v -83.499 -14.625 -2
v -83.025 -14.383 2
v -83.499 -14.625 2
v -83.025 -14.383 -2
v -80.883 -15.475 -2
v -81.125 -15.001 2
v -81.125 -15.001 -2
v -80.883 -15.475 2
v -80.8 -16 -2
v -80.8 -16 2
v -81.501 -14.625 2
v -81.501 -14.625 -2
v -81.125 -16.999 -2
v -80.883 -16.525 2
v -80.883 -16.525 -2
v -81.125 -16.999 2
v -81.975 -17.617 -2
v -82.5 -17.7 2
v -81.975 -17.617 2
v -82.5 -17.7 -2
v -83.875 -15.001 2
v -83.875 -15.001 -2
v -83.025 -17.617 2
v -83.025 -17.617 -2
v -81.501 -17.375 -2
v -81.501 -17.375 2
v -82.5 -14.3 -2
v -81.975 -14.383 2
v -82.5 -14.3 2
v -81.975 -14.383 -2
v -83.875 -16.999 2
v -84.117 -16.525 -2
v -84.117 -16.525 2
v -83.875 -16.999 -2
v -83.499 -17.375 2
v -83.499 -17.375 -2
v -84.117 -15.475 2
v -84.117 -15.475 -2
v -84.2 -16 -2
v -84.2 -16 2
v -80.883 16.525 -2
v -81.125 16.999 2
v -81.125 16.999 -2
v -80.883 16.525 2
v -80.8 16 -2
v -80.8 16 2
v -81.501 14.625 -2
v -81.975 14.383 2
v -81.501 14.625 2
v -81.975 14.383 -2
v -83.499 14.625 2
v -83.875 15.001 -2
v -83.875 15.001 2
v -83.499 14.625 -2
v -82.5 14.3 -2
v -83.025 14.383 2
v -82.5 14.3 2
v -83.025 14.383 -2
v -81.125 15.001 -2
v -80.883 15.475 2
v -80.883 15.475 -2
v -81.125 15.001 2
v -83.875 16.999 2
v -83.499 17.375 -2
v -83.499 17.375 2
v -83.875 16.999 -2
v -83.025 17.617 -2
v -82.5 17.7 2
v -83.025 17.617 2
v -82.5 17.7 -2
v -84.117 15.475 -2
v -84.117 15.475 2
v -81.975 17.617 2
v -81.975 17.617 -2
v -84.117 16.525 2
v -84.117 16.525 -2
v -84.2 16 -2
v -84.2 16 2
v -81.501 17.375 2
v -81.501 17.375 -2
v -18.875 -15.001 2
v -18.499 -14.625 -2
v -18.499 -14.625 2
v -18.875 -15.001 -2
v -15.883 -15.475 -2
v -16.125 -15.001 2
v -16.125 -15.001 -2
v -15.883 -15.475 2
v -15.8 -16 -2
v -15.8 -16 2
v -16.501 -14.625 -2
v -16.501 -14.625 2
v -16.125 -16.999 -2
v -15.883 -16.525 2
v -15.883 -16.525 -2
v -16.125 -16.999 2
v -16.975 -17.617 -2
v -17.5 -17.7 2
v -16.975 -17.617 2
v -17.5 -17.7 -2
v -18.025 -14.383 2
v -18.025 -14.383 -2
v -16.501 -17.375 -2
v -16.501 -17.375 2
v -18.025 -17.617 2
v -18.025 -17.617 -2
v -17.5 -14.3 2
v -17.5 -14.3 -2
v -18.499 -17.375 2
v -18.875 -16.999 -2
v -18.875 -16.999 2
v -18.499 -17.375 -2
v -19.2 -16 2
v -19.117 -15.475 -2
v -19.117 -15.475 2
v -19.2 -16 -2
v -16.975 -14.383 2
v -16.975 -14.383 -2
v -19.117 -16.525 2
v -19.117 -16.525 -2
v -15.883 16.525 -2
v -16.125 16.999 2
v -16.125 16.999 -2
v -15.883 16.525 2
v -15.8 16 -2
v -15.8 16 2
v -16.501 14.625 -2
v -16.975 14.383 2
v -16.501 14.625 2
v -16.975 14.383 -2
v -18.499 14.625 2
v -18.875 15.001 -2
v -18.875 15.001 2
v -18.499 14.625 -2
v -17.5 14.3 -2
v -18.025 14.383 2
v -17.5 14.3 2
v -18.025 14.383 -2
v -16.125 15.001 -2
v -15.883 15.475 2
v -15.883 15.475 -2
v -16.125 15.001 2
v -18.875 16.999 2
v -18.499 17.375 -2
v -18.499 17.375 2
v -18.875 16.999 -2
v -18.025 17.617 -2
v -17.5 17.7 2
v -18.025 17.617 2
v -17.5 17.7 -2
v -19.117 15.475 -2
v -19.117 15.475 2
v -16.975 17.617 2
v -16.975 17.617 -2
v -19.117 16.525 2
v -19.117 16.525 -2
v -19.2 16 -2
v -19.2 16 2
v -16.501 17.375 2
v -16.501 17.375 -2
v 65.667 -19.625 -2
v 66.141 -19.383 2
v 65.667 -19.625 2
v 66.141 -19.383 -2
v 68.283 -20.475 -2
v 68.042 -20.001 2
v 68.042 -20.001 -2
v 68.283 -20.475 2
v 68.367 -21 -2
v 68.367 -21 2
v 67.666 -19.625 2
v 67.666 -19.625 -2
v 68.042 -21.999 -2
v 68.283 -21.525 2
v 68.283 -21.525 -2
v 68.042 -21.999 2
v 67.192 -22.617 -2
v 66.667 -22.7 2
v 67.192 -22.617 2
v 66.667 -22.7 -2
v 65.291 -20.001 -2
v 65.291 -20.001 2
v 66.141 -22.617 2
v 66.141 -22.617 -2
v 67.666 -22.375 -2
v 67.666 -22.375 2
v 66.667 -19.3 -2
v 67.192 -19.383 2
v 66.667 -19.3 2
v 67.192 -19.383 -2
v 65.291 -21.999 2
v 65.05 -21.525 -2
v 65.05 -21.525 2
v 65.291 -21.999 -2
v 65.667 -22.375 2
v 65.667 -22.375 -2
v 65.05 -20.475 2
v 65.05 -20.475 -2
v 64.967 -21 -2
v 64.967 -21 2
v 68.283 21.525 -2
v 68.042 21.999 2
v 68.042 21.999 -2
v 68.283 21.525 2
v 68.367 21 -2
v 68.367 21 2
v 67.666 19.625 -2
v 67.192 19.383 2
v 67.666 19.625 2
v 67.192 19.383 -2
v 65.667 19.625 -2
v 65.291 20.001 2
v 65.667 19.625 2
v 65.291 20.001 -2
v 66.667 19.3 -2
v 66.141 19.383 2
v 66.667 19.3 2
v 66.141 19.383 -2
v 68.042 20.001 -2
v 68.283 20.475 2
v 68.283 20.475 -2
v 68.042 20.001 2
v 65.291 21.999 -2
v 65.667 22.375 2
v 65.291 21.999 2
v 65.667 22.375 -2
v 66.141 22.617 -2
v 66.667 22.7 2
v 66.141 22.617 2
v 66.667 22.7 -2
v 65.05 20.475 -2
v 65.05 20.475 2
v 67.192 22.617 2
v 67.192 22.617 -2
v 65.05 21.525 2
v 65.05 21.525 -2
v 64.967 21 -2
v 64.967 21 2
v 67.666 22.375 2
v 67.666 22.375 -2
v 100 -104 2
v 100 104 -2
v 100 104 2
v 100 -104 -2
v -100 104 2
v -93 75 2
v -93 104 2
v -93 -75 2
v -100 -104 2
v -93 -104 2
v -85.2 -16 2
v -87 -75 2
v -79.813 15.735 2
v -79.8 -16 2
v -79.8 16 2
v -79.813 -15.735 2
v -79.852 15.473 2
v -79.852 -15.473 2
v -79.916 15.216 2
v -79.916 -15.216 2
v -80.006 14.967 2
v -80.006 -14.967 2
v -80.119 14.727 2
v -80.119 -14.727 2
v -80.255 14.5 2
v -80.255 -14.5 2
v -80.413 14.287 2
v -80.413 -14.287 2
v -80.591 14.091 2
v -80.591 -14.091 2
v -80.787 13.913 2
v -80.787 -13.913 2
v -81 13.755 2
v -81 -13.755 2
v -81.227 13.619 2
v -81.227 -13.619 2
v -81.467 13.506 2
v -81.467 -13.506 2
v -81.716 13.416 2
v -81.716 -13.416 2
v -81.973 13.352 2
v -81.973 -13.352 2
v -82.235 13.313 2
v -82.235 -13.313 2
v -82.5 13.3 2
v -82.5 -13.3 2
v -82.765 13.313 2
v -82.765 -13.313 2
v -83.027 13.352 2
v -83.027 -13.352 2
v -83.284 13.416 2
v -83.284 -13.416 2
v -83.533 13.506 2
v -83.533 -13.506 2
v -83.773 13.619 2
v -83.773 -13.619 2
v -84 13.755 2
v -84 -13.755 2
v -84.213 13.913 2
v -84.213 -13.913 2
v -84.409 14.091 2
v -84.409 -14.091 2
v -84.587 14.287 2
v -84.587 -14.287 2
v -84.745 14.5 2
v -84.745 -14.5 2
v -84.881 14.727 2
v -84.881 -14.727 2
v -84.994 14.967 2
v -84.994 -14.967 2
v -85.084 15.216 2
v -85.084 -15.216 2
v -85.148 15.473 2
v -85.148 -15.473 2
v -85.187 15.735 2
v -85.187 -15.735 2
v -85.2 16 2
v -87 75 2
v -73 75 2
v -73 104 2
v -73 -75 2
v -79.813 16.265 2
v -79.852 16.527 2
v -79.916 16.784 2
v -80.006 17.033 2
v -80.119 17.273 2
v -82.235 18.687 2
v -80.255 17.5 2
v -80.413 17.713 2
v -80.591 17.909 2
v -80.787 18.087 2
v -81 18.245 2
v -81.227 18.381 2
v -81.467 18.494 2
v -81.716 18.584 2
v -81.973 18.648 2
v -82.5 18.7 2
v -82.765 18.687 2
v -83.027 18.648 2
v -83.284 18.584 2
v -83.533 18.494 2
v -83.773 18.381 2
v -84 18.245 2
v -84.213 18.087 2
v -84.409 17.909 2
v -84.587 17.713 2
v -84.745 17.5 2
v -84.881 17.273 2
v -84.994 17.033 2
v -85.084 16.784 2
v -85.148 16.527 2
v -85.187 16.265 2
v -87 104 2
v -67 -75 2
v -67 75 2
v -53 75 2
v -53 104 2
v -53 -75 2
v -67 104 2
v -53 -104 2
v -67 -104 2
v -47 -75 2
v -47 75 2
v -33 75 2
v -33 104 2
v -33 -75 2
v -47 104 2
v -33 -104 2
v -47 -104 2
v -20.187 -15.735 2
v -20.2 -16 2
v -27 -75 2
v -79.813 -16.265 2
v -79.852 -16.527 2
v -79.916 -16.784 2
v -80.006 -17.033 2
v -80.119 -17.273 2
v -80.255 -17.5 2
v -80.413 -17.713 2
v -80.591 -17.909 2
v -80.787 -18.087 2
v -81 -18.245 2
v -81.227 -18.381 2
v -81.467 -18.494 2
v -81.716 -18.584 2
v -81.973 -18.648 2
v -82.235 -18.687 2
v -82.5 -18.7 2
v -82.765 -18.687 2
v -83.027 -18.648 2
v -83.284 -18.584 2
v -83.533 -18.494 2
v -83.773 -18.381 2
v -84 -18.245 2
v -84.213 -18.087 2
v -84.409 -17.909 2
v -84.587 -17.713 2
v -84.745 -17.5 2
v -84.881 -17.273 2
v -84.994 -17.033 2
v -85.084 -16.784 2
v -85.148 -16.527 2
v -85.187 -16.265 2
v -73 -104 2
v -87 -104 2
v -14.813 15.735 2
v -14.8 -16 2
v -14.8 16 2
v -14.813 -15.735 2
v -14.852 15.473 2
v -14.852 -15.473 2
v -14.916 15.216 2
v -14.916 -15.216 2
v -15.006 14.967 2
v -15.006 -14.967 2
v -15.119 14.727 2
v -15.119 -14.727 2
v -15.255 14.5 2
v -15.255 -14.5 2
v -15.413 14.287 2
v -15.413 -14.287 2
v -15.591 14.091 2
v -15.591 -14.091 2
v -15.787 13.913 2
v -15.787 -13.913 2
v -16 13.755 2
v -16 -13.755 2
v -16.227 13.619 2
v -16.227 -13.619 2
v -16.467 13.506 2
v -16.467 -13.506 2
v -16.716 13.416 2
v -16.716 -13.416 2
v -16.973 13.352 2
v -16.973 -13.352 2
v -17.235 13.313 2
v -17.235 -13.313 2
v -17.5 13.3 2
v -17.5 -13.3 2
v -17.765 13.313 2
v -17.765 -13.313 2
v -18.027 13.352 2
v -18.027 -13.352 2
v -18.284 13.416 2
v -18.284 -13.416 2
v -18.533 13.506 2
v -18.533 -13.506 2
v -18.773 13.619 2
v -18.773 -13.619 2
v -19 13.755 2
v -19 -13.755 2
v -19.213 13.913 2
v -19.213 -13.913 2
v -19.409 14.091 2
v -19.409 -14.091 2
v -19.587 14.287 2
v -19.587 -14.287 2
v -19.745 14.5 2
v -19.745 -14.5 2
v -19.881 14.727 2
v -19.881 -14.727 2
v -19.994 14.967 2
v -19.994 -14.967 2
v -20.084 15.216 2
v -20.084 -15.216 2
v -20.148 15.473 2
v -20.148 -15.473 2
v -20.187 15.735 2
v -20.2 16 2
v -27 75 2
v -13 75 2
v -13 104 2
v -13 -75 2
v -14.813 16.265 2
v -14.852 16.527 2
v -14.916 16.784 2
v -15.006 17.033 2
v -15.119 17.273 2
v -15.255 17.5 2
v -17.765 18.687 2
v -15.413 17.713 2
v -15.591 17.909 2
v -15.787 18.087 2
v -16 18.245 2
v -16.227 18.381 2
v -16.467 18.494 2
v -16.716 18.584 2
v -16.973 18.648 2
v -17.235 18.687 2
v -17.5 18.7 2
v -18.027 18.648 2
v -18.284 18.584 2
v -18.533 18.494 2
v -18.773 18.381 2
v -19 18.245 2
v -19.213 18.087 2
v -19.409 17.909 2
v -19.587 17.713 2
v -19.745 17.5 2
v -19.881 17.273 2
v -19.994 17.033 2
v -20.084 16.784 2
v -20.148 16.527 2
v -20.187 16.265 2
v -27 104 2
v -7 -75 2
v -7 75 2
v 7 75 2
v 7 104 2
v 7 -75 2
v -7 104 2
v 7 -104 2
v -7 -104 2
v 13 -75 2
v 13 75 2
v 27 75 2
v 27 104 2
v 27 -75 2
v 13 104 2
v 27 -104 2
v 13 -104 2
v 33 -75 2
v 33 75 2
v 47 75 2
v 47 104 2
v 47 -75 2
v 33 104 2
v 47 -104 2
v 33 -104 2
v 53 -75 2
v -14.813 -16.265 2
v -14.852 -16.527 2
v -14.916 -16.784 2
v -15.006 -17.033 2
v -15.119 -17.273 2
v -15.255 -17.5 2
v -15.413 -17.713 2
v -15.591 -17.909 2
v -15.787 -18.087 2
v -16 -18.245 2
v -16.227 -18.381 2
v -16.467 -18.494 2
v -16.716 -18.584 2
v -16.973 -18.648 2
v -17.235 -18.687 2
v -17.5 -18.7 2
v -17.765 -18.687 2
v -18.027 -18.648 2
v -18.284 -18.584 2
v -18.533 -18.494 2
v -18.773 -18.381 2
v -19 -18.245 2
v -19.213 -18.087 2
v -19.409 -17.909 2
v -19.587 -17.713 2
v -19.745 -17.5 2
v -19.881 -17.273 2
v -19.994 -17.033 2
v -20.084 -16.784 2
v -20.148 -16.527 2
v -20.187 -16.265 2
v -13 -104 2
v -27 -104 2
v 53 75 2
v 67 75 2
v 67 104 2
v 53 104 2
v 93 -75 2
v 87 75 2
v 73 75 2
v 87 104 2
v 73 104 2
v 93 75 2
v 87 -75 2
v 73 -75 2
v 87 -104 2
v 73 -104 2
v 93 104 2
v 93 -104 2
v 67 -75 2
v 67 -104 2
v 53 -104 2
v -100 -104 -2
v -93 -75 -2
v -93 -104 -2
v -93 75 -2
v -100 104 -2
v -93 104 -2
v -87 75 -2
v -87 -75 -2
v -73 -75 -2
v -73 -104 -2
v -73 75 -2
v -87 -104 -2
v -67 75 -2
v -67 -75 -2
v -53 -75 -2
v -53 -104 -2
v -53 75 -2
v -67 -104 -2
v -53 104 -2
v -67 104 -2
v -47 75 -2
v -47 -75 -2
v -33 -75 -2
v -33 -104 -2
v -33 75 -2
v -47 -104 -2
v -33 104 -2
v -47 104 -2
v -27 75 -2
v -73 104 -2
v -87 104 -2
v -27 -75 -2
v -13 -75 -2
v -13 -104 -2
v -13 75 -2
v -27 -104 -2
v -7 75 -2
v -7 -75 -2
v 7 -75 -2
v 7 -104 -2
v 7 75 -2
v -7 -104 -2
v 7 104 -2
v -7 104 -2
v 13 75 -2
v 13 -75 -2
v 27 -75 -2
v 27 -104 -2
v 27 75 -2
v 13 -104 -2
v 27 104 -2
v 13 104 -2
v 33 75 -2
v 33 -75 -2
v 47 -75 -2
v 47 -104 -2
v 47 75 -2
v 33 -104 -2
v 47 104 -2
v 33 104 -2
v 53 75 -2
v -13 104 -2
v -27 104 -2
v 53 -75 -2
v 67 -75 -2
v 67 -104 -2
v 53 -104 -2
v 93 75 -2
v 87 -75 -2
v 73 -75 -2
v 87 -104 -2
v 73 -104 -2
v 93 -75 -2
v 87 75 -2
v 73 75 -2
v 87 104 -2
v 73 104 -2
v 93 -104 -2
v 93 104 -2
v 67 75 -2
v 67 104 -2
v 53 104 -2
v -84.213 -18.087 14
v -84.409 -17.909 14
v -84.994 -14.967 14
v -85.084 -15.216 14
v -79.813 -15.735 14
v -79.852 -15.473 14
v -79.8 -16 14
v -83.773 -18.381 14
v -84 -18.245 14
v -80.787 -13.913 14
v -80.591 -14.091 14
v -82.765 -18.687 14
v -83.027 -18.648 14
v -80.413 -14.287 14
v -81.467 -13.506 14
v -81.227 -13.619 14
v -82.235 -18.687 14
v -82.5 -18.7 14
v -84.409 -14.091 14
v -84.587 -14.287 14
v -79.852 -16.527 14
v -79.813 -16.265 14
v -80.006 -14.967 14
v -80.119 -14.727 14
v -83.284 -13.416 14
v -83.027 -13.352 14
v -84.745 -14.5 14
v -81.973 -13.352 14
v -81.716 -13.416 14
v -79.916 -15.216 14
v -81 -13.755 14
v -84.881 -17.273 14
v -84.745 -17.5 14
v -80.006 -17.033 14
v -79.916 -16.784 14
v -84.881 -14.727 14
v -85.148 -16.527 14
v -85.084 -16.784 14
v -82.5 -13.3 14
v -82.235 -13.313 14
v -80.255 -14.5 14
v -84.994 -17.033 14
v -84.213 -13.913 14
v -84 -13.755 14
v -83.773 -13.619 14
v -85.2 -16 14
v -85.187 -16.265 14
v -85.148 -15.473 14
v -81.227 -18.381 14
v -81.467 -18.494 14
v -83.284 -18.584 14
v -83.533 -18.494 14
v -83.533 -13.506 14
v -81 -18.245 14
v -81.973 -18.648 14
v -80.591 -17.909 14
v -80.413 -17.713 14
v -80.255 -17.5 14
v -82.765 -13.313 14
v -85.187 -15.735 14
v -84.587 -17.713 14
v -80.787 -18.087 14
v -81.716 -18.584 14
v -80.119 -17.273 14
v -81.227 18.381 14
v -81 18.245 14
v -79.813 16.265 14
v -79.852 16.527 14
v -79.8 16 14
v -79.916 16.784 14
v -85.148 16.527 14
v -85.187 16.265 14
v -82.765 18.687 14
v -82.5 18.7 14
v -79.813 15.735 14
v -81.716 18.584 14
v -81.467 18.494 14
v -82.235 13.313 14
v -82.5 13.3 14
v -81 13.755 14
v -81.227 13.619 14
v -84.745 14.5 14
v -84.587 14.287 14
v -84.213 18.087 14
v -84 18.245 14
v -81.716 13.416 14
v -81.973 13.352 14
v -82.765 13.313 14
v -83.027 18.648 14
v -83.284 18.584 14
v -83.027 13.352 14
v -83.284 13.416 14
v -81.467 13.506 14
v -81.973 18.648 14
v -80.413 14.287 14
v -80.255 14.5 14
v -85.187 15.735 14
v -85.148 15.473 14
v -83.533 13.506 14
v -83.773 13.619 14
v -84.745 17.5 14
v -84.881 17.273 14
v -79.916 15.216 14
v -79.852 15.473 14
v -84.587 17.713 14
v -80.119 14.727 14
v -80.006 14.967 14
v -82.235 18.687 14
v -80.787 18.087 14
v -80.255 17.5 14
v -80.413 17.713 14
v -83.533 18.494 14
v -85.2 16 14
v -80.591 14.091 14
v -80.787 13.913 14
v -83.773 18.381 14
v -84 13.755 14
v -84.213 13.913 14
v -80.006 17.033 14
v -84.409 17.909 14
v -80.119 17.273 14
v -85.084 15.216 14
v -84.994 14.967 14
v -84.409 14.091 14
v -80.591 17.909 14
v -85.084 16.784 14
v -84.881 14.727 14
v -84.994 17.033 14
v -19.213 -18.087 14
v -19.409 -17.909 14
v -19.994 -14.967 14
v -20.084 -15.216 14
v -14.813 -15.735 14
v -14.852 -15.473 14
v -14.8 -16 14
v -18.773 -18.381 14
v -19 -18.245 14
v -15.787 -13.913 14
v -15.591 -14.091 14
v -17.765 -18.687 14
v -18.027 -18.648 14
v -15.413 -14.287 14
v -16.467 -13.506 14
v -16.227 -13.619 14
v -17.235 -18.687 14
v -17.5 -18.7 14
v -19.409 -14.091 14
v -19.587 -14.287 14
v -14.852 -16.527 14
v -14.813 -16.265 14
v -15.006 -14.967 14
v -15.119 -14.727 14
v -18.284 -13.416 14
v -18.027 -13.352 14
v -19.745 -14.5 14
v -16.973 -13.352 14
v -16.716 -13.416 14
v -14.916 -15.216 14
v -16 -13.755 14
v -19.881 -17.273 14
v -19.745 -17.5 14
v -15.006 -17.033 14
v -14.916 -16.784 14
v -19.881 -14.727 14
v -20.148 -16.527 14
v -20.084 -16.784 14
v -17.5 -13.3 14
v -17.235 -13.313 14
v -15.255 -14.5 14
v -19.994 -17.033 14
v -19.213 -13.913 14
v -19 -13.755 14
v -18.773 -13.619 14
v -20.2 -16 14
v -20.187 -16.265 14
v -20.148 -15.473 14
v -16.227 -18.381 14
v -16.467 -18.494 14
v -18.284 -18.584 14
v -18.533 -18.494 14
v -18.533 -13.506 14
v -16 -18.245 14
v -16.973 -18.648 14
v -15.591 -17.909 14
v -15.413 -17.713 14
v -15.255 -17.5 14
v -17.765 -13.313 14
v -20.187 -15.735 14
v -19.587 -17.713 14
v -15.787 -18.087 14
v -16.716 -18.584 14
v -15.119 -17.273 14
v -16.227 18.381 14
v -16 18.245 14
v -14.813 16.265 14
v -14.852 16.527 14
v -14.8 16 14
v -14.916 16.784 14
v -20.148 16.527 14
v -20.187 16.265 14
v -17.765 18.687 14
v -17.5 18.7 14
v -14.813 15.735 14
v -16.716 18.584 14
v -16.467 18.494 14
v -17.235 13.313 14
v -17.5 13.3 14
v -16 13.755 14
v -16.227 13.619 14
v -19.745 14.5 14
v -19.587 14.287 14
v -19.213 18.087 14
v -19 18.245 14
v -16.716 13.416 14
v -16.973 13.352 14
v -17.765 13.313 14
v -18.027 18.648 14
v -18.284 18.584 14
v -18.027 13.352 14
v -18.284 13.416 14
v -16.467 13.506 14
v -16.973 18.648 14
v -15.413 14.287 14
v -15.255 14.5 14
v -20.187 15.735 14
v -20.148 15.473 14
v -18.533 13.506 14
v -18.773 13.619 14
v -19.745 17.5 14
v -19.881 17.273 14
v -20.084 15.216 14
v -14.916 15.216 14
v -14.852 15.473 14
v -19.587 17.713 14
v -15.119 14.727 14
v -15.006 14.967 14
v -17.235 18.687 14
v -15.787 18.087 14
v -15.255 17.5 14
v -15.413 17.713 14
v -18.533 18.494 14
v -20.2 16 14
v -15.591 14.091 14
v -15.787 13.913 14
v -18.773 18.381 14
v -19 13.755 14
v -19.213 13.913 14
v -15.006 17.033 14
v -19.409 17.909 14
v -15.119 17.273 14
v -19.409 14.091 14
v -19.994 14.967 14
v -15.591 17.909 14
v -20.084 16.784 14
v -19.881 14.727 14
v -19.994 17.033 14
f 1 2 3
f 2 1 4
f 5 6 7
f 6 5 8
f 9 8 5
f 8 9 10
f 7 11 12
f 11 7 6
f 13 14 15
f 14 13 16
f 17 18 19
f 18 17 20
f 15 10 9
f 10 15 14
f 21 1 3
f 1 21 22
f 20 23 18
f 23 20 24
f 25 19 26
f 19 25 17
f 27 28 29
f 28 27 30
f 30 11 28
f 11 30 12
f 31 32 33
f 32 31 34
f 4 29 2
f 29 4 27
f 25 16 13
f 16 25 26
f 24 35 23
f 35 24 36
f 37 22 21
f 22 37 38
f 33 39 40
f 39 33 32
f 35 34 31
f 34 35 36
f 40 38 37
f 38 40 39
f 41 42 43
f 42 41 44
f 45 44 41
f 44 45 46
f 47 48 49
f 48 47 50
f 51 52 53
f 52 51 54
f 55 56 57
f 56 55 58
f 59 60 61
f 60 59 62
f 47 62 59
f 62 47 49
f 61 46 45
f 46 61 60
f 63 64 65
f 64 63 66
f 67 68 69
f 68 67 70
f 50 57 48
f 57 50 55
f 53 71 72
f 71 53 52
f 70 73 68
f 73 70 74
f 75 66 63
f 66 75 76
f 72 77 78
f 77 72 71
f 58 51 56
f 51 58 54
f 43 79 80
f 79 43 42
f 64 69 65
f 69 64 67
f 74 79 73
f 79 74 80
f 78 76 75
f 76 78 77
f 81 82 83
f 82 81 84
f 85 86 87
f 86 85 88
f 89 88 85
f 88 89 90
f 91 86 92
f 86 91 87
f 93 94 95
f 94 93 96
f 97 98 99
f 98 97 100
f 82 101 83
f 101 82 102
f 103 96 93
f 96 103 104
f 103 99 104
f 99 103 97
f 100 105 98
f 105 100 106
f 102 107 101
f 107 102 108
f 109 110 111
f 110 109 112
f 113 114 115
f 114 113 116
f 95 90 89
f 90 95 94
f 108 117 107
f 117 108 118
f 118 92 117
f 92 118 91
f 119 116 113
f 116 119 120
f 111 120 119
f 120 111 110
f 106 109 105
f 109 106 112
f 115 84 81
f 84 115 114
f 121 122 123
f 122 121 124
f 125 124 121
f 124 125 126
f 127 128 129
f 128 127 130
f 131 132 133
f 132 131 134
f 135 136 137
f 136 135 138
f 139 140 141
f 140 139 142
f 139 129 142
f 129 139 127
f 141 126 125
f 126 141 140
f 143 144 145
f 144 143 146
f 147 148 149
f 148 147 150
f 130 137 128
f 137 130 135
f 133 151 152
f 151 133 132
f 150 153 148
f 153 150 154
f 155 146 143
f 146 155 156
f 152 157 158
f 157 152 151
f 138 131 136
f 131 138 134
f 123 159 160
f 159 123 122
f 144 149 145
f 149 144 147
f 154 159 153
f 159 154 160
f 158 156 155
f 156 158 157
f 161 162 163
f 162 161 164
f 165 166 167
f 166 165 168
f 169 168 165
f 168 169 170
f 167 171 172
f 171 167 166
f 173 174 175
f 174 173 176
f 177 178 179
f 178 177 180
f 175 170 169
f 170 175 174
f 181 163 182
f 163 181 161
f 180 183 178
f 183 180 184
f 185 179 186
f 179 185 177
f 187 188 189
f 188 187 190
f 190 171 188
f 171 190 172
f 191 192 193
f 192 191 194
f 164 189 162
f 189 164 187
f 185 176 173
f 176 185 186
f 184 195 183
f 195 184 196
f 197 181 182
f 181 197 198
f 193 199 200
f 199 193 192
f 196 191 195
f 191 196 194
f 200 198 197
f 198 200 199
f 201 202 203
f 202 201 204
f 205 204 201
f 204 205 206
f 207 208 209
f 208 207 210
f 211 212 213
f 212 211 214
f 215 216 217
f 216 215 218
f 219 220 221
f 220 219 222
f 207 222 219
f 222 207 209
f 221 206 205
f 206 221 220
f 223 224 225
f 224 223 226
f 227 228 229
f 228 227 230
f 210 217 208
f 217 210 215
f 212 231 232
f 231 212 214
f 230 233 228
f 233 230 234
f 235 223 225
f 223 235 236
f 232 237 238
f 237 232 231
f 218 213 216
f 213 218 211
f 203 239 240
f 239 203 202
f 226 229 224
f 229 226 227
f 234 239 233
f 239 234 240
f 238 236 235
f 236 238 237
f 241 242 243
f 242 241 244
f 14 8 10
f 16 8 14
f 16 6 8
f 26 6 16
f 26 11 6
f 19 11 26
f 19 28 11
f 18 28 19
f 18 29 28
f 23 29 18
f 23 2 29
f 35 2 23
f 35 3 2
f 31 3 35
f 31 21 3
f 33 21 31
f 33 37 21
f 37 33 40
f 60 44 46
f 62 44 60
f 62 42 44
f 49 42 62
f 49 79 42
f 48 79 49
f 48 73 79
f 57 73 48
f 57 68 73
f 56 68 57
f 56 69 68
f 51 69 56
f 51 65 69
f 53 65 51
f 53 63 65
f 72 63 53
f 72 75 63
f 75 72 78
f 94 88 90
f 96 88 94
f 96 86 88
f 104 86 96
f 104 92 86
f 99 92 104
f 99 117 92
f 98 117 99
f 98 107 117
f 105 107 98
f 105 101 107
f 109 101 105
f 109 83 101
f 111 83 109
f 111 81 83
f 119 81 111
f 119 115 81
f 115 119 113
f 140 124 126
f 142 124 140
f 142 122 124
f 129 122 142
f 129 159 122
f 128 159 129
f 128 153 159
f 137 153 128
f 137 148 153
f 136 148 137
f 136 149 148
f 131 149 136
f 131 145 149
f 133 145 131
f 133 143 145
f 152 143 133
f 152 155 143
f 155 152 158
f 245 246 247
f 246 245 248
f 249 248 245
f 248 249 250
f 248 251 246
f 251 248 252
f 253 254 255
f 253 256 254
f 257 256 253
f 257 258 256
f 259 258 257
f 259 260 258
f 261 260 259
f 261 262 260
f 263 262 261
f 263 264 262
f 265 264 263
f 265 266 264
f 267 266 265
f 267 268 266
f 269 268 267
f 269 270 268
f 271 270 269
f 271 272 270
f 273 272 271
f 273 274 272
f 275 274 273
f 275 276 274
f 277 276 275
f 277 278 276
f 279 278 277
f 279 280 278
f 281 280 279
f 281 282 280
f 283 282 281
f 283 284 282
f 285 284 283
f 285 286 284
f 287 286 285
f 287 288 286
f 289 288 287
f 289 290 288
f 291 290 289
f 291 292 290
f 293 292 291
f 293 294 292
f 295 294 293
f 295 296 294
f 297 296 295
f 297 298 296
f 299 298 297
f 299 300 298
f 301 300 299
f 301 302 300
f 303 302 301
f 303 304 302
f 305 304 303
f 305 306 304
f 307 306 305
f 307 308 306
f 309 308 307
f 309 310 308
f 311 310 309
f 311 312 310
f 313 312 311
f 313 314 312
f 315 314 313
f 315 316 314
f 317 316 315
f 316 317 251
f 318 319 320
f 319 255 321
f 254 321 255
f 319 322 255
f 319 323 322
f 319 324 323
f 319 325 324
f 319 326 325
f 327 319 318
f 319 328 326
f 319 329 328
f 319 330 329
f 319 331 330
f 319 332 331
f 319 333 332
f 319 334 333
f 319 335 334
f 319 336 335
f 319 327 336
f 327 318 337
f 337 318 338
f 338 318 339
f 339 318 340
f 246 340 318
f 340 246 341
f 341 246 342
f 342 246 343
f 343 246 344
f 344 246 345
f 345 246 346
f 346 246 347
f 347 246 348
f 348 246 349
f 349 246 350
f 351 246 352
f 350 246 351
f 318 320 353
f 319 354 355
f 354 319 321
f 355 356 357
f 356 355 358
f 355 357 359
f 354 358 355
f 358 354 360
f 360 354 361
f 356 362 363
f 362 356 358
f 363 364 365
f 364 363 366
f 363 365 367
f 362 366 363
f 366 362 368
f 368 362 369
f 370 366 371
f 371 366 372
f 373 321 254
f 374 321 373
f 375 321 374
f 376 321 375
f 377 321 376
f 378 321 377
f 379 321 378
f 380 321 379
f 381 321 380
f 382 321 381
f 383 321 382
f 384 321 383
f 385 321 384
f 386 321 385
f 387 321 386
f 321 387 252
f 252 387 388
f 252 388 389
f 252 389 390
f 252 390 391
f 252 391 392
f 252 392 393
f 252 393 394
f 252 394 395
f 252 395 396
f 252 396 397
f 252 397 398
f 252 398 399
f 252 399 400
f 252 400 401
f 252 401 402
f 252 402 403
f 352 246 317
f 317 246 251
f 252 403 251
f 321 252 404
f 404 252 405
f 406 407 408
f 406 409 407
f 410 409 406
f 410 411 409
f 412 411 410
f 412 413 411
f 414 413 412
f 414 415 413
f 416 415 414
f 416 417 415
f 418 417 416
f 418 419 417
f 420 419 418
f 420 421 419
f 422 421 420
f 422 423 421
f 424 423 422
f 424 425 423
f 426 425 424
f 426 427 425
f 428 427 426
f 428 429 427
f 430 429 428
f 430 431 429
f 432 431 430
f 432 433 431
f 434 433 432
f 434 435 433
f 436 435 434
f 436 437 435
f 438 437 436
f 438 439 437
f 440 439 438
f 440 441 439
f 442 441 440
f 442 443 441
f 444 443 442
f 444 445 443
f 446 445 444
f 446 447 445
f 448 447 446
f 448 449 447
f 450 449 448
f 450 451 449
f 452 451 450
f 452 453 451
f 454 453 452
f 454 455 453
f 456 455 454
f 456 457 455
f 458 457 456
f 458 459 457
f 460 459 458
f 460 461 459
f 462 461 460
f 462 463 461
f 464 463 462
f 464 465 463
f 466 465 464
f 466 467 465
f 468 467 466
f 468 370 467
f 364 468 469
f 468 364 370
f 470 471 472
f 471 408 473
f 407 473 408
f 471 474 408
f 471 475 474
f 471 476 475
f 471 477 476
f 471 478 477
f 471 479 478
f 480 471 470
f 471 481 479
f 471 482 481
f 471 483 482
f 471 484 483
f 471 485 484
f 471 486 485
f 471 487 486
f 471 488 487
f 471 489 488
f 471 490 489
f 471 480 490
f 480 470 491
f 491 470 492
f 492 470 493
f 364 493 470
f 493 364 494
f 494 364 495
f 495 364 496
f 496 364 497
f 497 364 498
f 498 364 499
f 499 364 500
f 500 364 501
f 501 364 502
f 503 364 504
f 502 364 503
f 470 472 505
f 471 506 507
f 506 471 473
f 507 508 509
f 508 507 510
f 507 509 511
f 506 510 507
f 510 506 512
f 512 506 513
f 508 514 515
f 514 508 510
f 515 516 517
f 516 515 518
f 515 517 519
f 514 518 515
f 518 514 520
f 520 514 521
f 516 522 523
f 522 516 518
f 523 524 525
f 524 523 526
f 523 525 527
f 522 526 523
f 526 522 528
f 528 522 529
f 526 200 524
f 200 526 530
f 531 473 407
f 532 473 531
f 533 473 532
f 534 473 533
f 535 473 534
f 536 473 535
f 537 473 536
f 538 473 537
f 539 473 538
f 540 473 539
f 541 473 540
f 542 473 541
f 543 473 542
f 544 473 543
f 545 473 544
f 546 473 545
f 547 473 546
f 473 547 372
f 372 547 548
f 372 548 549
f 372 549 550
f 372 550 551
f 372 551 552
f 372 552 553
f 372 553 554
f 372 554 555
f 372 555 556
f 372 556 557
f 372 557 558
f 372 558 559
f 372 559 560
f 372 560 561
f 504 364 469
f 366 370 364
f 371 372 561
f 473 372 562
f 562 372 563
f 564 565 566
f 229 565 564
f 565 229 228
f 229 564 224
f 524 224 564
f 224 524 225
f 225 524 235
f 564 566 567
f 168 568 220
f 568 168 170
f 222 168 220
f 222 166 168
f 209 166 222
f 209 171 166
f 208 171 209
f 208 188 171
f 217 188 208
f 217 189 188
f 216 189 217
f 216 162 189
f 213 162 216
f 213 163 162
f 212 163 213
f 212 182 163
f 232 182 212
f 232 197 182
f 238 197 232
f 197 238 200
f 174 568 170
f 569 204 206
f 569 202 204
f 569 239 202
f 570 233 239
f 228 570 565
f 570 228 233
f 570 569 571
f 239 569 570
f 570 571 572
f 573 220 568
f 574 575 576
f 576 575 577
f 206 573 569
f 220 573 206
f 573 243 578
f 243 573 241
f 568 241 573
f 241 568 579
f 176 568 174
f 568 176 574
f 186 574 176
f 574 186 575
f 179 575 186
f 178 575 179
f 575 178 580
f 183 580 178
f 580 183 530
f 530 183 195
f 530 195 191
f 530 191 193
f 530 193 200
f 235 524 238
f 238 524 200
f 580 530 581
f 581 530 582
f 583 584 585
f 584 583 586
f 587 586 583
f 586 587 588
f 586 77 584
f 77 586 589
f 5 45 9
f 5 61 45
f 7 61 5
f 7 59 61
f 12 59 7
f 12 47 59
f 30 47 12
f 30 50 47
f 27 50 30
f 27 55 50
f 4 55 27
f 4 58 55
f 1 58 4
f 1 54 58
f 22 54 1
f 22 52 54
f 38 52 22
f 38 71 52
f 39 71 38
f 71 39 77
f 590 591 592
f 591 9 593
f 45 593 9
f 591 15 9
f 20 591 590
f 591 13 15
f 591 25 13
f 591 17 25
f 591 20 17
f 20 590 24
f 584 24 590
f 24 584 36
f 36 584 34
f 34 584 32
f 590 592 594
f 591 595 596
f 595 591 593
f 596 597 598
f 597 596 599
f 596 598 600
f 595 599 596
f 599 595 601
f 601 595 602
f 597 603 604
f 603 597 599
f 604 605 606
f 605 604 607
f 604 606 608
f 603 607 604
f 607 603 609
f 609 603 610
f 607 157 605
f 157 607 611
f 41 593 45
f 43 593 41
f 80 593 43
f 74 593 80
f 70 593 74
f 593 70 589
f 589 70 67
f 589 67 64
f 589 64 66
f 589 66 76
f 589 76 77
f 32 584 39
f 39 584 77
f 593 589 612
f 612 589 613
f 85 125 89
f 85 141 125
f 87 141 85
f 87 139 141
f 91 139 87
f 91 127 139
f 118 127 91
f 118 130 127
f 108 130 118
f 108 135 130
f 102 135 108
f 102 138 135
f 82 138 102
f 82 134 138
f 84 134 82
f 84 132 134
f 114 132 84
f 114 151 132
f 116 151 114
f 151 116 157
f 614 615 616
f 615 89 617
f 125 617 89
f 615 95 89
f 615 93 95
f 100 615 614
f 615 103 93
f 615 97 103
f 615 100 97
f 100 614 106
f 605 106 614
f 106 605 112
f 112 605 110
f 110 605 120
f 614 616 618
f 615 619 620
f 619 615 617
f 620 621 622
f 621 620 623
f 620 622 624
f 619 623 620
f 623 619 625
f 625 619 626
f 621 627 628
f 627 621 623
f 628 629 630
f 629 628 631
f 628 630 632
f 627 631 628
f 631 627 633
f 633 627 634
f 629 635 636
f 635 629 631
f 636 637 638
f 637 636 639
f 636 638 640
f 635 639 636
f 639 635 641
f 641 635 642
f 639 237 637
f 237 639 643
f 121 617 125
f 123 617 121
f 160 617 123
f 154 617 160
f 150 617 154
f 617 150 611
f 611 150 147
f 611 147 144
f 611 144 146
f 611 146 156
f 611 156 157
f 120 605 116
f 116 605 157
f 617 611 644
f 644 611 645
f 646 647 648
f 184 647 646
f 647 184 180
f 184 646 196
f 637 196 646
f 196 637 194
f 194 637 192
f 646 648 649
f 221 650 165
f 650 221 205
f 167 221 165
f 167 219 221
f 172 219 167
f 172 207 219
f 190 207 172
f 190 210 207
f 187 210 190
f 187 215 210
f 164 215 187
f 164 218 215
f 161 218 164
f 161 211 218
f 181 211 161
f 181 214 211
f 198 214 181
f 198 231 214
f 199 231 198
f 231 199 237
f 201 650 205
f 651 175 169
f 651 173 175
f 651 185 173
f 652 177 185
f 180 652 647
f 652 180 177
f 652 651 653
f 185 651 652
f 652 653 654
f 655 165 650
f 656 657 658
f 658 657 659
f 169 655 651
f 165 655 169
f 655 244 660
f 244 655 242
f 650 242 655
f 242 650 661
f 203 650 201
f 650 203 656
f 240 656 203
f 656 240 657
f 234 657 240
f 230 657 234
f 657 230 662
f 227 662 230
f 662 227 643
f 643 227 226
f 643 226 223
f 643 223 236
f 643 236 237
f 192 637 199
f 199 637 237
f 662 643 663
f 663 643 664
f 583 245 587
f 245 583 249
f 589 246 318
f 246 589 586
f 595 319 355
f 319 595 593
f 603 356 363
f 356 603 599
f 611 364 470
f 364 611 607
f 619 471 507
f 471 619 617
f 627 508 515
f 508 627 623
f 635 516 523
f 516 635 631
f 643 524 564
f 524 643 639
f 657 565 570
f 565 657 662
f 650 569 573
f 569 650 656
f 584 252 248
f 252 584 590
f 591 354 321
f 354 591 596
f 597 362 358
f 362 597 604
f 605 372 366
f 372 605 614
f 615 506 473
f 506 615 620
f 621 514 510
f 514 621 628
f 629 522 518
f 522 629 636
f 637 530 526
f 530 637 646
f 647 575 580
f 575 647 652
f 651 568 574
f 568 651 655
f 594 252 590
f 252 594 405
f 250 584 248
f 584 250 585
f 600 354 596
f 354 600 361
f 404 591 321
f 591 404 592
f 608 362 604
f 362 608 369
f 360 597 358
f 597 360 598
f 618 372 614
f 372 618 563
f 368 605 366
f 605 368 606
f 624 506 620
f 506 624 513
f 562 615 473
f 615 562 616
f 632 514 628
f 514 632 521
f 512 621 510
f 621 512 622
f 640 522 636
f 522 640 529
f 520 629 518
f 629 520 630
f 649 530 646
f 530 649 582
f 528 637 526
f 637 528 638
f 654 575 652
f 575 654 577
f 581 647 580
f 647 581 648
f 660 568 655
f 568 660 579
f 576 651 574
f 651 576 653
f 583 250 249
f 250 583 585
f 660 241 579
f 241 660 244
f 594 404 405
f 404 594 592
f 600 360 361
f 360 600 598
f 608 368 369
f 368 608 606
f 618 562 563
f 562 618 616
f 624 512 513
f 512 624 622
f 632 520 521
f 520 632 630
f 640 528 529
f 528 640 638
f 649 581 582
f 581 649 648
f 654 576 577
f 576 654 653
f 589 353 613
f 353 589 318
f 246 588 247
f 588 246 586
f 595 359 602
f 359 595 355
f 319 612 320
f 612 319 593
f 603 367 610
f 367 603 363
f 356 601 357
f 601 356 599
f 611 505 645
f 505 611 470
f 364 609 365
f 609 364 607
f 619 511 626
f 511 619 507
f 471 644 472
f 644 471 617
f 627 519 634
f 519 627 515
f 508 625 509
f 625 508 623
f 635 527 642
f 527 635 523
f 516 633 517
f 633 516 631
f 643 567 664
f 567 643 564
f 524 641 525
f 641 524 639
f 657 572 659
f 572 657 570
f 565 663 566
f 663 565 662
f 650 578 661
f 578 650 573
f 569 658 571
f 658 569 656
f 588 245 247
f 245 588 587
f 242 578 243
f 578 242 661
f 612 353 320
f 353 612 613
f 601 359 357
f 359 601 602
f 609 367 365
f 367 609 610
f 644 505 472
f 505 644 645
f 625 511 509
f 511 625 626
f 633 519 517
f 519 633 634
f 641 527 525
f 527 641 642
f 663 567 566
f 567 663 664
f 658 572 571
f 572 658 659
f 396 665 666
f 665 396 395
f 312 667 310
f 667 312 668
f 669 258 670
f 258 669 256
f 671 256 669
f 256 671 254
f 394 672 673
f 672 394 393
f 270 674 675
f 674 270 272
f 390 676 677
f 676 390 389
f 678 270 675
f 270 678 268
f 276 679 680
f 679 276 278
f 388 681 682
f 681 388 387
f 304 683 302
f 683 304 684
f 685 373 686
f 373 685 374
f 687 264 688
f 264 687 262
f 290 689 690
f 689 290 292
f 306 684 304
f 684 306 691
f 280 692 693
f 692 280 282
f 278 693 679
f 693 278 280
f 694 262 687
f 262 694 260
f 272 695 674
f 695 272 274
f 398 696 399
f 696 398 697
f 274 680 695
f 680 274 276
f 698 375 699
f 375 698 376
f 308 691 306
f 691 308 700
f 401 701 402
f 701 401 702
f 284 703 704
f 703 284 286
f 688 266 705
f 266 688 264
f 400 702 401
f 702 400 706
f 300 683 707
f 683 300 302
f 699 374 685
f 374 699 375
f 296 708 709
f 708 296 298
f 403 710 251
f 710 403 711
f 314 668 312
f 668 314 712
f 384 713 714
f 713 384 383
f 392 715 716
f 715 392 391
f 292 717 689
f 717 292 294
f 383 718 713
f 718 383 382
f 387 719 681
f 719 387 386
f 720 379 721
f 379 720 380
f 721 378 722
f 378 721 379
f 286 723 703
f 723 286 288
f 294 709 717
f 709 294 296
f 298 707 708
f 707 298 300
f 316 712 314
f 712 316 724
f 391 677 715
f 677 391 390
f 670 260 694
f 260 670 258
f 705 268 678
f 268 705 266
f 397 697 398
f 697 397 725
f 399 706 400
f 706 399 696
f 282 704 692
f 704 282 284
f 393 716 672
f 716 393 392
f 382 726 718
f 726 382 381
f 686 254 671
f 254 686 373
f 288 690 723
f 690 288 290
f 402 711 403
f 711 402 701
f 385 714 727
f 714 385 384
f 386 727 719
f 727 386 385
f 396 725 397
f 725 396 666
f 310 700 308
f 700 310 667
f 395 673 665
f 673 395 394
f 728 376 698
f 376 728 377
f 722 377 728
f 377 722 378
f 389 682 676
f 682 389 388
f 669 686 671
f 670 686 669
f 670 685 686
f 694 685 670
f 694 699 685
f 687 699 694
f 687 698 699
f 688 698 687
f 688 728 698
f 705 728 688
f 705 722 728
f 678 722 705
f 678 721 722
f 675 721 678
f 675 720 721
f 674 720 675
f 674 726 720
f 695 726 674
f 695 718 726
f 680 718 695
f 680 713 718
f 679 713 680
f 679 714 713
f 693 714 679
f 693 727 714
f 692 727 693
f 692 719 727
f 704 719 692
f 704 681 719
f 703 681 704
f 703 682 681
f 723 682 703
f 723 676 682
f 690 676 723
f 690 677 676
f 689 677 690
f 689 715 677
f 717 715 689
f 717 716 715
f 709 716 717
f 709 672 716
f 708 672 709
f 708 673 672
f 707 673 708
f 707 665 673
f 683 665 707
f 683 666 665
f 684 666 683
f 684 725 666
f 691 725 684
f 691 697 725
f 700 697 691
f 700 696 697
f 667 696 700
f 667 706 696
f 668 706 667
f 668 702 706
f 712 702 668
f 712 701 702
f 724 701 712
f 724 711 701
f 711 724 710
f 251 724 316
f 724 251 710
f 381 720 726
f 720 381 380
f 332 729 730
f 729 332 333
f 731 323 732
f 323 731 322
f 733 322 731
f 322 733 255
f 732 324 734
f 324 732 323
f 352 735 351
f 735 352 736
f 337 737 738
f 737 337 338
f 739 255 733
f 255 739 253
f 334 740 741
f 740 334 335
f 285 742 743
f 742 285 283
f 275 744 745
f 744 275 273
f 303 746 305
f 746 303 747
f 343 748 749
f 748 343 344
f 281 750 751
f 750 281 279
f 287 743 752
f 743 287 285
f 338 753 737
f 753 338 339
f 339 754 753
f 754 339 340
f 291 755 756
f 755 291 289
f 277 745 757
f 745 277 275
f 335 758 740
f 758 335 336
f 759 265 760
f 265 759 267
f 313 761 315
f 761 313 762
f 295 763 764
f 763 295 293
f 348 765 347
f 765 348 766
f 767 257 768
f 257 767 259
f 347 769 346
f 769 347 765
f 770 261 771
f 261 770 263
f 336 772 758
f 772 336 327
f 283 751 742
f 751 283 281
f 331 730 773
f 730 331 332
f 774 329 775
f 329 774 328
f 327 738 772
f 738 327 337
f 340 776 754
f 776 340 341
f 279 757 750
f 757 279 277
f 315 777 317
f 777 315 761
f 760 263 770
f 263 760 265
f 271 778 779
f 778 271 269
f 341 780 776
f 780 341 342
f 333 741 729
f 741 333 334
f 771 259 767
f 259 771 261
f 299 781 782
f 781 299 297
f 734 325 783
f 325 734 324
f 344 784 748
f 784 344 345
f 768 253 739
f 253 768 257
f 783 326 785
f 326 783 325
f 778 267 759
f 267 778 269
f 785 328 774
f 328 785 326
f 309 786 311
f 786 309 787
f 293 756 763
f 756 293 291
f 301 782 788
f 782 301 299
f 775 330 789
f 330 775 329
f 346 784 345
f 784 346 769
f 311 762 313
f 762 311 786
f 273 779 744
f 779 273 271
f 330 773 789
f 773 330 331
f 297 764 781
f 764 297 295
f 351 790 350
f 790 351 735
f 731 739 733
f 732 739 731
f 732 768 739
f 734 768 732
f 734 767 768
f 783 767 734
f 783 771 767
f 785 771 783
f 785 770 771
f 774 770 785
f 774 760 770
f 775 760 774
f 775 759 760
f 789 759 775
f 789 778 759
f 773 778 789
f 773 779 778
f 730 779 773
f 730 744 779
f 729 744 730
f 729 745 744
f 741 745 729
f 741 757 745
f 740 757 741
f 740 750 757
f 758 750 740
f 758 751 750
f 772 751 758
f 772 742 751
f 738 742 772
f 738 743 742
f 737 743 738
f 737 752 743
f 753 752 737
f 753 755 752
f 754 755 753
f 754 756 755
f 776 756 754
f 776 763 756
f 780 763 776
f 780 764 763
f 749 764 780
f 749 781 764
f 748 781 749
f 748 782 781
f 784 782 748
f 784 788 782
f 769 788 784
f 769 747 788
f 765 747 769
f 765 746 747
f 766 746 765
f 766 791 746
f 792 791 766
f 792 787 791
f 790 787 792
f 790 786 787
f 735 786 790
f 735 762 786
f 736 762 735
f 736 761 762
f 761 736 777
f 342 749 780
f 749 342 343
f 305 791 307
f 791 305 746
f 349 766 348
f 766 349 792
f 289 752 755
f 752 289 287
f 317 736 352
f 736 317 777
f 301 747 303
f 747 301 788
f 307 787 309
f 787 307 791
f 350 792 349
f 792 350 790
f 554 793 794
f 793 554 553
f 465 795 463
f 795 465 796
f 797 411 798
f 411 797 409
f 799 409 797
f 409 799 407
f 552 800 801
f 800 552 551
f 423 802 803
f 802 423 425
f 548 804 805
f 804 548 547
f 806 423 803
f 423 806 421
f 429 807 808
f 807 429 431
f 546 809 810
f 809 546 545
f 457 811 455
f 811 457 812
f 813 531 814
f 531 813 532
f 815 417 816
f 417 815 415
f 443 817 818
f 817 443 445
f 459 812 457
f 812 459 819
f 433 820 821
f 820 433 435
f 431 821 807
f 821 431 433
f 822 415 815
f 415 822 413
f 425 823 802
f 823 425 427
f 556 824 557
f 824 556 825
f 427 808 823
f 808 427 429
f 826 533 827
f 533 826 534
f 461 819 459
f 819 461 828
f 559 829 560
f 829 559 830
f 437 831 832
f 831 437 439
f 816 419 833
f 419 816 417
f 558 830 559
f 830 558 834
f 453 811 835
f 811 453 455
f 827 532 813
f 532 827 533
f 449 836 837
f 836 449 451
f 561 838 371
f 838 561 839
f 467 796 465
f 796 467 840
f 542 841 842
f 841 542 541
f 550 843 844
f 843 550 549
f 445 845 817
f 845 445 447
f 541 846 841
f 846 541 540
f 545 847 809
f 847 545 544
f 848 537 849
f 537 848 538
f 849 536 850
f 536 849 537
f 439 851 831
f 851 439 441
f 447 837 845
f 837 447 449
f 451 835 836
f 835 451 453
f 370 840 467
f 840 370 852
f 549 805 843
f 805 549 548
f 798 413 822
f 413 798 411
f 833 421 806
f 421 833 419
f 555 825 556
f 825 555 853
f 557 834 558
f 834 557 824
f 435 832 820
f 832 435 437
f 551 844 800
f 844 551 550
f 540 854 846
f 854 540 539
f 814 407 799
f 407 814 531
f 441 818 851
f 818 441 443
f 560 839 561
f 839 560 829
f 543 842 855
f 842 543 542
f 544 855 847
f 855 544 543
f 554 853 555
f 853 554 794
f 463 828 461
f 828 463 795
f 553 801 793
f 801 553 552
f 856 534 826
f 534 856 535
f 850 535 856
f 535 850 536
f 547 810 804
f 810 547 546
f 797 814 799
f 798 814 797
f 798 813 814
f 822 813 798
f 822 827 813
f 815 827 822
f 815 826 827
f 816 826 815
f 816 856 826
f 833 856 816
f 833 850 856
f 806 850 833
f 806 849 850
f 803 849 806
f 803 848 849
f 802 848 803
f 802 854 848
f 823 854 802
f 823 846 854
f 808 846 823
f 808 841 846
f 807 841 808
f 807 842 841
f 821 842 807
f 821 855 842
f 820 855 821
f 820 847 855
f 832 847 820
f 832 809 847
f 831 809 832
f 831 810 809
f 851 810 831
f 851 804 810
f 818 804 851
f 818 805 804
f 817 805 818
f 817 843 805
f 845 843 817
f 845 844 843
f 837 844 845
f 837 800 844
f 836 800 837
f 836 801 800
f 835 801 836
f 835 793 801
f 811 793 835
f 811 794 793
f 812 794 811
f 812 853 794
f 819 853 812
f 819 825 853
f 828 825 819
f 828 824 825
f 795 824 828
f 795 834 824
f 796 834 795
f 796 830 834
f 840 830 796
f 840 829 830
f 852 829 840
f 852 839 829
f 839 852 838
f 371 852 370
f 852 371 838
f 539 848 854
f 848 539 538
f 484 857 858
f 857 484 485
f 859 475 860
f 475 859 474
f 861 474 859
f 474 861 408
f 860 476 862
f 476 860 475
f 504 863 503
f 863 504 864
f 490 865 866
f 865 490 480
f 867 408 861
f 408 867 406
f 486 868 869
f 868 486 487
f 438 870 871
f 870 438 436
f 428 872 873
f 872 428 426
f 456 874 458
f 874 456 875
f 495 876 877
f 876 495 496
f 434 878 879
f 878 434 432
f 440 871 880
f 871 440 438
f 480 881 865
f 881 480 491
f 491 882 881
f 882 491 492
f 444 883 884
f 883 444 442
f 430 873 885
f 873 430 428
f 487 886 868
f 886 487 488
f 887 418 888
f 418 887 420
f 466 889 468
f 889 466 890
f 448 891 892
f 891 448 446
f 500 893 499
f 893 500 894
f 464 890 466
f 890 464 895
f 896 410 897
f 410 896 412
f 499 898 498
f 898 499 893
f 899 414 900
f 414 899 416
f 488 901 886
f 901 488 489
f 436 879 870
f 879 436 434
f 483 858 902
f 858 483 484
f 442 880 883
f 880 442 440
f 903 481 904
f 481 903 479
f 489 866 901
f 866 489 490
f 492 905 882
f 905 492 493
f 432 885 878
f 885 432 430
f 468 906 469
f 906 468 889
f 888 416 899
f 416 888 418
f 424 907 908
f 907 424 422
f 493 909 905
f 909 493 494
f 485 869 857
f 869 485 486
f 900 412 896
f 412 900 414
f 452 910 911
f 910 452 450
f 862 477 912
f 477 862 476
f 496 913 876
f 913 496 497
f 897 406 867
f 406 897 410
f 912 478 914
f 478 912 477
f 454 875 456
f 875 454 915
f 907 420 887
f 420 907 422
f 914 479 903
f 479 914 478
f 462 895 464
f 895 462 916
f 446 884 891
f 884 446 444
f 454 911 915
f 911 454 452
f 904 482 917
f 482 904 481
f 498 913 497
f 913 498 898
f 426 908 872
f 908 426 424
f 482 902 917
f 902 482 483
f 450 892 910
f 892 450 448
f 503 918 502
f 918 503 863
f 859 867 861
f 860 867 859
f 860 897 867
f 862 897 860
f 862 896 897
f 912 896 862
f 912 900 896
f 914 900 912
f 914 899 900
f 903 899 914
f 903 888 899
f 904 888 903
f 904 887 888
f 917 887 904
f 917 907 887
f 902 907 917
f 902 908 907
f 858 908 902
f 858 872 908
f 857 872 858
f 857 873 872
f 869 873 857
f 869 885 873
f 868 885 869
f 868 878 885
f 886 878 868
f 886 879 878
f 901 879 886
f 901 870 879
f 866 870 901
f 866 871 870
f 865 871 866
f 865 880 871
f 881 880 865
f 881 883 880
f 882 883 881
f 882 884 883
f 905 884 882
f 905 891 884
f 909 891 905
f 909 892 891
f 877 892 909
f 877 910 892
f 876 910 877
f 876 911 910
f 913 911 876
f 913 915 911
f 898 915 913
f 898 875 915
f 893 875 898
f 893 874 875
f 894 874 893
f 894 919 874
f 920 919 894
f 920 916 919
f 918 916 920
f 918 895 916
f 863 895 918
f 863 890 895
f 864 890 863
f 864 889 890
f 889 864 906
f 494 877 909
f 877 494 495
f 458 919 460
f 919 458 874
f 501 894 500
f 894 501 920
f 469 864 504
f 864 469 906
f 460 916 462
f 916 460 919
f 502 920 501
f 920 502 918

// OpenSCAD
// Parametric expandable modular chassis for the MyZubster mother robot.
// Houses the ESP32 controller, motor drivers, and provides expansion rails
// for the assembly arm and component magazine.
// Issue #78 task: Disegnare il telaio del robot madre (STL).
// Print in PETG or ABS, 80% infill for rigidity + heat resistance.

// Parameters (mm)
chassis_base_l = 200;       // base plate length
chassis_base_w = 150;      // base plate width
chassis_base_h = 4;       // base plate thickness
rail_height = 30;         // expansion rail height
rail_slot_w = 6;          // T-slot width for modular attachments
esp32_mount_l = 65;       // ESP32 module footprint length
esp32_mount_w = 32;      // ESP32 module footprint width
esp32_mount_h = 12;      // ESP32 standoff height
motor_mount_d = 42;      // N20 gearmotor mount spacing
bolt_dia = 3.4;           // M3 fasteners
side_count = 2;           // expansion sides

$fn = 64;

module mother_chassis() {
  difference() {
    // base plate
    cube([chassis_base_l, chassis_base_w, chassis_base_h], center = true);
    // ESP32 mounting area
    translate([-chassis_base_l / 4, 0, 0])
      for (sx = [-1, 1], sy = [-1, 1])
        translate([sx * esp32_mount_l / 2, sy * esp32_mount_w / 2, 0])
          cylinder(h = chassis_base_h + 2, d = bolt_dia, $fn = 20, center = true);
    // motor mount holes (2 motors at rear)
    translate([chassis_base_l / 3, 0, 0])
      for (sy = [-1, 1])
        translate([0, sy * motor_mount_d / 2, 0])
          cylinder(h = chassis_base_h + 2, d = bolt_dia, $fn = 20, center = true);
  }
  // expansion rails (both sides)
  for (sy = [-1, 1])
    translate([0, sy * (chassis_base_w / 2 + rail_height / 2 - 1), 0]) {
      difference() {
        cube([chassis_base_l, rail_height, chassis_base_h], center = true);
        // T-slots every 20mm
        for (x = [-chassis_base_l / 2 + 10 : 20 : chassis_base_l / 2 - 10])
          translate([x, 0, 0])
            cube([rail_slot_w, rail_height + 2, chassis_base_h + 2], center = true);
      }
    }
  // ESP32 standoffs
  translate([-chassis_base_l / 4, 0, chassis_base_h / 2])
    for (sx = [-1, 1], sy = [-1, 1])
      translate([sx * esp32_mount_l / 2, sy * esp32_mount_w / 2, esp32_mount_h / 2])
        cylinder(h = esp32_mount_h, d = bolt_dia + 2, center = true);
}

mother_chassis();
// Orient base-down; attach arm on left rail, magazine on right rail.
